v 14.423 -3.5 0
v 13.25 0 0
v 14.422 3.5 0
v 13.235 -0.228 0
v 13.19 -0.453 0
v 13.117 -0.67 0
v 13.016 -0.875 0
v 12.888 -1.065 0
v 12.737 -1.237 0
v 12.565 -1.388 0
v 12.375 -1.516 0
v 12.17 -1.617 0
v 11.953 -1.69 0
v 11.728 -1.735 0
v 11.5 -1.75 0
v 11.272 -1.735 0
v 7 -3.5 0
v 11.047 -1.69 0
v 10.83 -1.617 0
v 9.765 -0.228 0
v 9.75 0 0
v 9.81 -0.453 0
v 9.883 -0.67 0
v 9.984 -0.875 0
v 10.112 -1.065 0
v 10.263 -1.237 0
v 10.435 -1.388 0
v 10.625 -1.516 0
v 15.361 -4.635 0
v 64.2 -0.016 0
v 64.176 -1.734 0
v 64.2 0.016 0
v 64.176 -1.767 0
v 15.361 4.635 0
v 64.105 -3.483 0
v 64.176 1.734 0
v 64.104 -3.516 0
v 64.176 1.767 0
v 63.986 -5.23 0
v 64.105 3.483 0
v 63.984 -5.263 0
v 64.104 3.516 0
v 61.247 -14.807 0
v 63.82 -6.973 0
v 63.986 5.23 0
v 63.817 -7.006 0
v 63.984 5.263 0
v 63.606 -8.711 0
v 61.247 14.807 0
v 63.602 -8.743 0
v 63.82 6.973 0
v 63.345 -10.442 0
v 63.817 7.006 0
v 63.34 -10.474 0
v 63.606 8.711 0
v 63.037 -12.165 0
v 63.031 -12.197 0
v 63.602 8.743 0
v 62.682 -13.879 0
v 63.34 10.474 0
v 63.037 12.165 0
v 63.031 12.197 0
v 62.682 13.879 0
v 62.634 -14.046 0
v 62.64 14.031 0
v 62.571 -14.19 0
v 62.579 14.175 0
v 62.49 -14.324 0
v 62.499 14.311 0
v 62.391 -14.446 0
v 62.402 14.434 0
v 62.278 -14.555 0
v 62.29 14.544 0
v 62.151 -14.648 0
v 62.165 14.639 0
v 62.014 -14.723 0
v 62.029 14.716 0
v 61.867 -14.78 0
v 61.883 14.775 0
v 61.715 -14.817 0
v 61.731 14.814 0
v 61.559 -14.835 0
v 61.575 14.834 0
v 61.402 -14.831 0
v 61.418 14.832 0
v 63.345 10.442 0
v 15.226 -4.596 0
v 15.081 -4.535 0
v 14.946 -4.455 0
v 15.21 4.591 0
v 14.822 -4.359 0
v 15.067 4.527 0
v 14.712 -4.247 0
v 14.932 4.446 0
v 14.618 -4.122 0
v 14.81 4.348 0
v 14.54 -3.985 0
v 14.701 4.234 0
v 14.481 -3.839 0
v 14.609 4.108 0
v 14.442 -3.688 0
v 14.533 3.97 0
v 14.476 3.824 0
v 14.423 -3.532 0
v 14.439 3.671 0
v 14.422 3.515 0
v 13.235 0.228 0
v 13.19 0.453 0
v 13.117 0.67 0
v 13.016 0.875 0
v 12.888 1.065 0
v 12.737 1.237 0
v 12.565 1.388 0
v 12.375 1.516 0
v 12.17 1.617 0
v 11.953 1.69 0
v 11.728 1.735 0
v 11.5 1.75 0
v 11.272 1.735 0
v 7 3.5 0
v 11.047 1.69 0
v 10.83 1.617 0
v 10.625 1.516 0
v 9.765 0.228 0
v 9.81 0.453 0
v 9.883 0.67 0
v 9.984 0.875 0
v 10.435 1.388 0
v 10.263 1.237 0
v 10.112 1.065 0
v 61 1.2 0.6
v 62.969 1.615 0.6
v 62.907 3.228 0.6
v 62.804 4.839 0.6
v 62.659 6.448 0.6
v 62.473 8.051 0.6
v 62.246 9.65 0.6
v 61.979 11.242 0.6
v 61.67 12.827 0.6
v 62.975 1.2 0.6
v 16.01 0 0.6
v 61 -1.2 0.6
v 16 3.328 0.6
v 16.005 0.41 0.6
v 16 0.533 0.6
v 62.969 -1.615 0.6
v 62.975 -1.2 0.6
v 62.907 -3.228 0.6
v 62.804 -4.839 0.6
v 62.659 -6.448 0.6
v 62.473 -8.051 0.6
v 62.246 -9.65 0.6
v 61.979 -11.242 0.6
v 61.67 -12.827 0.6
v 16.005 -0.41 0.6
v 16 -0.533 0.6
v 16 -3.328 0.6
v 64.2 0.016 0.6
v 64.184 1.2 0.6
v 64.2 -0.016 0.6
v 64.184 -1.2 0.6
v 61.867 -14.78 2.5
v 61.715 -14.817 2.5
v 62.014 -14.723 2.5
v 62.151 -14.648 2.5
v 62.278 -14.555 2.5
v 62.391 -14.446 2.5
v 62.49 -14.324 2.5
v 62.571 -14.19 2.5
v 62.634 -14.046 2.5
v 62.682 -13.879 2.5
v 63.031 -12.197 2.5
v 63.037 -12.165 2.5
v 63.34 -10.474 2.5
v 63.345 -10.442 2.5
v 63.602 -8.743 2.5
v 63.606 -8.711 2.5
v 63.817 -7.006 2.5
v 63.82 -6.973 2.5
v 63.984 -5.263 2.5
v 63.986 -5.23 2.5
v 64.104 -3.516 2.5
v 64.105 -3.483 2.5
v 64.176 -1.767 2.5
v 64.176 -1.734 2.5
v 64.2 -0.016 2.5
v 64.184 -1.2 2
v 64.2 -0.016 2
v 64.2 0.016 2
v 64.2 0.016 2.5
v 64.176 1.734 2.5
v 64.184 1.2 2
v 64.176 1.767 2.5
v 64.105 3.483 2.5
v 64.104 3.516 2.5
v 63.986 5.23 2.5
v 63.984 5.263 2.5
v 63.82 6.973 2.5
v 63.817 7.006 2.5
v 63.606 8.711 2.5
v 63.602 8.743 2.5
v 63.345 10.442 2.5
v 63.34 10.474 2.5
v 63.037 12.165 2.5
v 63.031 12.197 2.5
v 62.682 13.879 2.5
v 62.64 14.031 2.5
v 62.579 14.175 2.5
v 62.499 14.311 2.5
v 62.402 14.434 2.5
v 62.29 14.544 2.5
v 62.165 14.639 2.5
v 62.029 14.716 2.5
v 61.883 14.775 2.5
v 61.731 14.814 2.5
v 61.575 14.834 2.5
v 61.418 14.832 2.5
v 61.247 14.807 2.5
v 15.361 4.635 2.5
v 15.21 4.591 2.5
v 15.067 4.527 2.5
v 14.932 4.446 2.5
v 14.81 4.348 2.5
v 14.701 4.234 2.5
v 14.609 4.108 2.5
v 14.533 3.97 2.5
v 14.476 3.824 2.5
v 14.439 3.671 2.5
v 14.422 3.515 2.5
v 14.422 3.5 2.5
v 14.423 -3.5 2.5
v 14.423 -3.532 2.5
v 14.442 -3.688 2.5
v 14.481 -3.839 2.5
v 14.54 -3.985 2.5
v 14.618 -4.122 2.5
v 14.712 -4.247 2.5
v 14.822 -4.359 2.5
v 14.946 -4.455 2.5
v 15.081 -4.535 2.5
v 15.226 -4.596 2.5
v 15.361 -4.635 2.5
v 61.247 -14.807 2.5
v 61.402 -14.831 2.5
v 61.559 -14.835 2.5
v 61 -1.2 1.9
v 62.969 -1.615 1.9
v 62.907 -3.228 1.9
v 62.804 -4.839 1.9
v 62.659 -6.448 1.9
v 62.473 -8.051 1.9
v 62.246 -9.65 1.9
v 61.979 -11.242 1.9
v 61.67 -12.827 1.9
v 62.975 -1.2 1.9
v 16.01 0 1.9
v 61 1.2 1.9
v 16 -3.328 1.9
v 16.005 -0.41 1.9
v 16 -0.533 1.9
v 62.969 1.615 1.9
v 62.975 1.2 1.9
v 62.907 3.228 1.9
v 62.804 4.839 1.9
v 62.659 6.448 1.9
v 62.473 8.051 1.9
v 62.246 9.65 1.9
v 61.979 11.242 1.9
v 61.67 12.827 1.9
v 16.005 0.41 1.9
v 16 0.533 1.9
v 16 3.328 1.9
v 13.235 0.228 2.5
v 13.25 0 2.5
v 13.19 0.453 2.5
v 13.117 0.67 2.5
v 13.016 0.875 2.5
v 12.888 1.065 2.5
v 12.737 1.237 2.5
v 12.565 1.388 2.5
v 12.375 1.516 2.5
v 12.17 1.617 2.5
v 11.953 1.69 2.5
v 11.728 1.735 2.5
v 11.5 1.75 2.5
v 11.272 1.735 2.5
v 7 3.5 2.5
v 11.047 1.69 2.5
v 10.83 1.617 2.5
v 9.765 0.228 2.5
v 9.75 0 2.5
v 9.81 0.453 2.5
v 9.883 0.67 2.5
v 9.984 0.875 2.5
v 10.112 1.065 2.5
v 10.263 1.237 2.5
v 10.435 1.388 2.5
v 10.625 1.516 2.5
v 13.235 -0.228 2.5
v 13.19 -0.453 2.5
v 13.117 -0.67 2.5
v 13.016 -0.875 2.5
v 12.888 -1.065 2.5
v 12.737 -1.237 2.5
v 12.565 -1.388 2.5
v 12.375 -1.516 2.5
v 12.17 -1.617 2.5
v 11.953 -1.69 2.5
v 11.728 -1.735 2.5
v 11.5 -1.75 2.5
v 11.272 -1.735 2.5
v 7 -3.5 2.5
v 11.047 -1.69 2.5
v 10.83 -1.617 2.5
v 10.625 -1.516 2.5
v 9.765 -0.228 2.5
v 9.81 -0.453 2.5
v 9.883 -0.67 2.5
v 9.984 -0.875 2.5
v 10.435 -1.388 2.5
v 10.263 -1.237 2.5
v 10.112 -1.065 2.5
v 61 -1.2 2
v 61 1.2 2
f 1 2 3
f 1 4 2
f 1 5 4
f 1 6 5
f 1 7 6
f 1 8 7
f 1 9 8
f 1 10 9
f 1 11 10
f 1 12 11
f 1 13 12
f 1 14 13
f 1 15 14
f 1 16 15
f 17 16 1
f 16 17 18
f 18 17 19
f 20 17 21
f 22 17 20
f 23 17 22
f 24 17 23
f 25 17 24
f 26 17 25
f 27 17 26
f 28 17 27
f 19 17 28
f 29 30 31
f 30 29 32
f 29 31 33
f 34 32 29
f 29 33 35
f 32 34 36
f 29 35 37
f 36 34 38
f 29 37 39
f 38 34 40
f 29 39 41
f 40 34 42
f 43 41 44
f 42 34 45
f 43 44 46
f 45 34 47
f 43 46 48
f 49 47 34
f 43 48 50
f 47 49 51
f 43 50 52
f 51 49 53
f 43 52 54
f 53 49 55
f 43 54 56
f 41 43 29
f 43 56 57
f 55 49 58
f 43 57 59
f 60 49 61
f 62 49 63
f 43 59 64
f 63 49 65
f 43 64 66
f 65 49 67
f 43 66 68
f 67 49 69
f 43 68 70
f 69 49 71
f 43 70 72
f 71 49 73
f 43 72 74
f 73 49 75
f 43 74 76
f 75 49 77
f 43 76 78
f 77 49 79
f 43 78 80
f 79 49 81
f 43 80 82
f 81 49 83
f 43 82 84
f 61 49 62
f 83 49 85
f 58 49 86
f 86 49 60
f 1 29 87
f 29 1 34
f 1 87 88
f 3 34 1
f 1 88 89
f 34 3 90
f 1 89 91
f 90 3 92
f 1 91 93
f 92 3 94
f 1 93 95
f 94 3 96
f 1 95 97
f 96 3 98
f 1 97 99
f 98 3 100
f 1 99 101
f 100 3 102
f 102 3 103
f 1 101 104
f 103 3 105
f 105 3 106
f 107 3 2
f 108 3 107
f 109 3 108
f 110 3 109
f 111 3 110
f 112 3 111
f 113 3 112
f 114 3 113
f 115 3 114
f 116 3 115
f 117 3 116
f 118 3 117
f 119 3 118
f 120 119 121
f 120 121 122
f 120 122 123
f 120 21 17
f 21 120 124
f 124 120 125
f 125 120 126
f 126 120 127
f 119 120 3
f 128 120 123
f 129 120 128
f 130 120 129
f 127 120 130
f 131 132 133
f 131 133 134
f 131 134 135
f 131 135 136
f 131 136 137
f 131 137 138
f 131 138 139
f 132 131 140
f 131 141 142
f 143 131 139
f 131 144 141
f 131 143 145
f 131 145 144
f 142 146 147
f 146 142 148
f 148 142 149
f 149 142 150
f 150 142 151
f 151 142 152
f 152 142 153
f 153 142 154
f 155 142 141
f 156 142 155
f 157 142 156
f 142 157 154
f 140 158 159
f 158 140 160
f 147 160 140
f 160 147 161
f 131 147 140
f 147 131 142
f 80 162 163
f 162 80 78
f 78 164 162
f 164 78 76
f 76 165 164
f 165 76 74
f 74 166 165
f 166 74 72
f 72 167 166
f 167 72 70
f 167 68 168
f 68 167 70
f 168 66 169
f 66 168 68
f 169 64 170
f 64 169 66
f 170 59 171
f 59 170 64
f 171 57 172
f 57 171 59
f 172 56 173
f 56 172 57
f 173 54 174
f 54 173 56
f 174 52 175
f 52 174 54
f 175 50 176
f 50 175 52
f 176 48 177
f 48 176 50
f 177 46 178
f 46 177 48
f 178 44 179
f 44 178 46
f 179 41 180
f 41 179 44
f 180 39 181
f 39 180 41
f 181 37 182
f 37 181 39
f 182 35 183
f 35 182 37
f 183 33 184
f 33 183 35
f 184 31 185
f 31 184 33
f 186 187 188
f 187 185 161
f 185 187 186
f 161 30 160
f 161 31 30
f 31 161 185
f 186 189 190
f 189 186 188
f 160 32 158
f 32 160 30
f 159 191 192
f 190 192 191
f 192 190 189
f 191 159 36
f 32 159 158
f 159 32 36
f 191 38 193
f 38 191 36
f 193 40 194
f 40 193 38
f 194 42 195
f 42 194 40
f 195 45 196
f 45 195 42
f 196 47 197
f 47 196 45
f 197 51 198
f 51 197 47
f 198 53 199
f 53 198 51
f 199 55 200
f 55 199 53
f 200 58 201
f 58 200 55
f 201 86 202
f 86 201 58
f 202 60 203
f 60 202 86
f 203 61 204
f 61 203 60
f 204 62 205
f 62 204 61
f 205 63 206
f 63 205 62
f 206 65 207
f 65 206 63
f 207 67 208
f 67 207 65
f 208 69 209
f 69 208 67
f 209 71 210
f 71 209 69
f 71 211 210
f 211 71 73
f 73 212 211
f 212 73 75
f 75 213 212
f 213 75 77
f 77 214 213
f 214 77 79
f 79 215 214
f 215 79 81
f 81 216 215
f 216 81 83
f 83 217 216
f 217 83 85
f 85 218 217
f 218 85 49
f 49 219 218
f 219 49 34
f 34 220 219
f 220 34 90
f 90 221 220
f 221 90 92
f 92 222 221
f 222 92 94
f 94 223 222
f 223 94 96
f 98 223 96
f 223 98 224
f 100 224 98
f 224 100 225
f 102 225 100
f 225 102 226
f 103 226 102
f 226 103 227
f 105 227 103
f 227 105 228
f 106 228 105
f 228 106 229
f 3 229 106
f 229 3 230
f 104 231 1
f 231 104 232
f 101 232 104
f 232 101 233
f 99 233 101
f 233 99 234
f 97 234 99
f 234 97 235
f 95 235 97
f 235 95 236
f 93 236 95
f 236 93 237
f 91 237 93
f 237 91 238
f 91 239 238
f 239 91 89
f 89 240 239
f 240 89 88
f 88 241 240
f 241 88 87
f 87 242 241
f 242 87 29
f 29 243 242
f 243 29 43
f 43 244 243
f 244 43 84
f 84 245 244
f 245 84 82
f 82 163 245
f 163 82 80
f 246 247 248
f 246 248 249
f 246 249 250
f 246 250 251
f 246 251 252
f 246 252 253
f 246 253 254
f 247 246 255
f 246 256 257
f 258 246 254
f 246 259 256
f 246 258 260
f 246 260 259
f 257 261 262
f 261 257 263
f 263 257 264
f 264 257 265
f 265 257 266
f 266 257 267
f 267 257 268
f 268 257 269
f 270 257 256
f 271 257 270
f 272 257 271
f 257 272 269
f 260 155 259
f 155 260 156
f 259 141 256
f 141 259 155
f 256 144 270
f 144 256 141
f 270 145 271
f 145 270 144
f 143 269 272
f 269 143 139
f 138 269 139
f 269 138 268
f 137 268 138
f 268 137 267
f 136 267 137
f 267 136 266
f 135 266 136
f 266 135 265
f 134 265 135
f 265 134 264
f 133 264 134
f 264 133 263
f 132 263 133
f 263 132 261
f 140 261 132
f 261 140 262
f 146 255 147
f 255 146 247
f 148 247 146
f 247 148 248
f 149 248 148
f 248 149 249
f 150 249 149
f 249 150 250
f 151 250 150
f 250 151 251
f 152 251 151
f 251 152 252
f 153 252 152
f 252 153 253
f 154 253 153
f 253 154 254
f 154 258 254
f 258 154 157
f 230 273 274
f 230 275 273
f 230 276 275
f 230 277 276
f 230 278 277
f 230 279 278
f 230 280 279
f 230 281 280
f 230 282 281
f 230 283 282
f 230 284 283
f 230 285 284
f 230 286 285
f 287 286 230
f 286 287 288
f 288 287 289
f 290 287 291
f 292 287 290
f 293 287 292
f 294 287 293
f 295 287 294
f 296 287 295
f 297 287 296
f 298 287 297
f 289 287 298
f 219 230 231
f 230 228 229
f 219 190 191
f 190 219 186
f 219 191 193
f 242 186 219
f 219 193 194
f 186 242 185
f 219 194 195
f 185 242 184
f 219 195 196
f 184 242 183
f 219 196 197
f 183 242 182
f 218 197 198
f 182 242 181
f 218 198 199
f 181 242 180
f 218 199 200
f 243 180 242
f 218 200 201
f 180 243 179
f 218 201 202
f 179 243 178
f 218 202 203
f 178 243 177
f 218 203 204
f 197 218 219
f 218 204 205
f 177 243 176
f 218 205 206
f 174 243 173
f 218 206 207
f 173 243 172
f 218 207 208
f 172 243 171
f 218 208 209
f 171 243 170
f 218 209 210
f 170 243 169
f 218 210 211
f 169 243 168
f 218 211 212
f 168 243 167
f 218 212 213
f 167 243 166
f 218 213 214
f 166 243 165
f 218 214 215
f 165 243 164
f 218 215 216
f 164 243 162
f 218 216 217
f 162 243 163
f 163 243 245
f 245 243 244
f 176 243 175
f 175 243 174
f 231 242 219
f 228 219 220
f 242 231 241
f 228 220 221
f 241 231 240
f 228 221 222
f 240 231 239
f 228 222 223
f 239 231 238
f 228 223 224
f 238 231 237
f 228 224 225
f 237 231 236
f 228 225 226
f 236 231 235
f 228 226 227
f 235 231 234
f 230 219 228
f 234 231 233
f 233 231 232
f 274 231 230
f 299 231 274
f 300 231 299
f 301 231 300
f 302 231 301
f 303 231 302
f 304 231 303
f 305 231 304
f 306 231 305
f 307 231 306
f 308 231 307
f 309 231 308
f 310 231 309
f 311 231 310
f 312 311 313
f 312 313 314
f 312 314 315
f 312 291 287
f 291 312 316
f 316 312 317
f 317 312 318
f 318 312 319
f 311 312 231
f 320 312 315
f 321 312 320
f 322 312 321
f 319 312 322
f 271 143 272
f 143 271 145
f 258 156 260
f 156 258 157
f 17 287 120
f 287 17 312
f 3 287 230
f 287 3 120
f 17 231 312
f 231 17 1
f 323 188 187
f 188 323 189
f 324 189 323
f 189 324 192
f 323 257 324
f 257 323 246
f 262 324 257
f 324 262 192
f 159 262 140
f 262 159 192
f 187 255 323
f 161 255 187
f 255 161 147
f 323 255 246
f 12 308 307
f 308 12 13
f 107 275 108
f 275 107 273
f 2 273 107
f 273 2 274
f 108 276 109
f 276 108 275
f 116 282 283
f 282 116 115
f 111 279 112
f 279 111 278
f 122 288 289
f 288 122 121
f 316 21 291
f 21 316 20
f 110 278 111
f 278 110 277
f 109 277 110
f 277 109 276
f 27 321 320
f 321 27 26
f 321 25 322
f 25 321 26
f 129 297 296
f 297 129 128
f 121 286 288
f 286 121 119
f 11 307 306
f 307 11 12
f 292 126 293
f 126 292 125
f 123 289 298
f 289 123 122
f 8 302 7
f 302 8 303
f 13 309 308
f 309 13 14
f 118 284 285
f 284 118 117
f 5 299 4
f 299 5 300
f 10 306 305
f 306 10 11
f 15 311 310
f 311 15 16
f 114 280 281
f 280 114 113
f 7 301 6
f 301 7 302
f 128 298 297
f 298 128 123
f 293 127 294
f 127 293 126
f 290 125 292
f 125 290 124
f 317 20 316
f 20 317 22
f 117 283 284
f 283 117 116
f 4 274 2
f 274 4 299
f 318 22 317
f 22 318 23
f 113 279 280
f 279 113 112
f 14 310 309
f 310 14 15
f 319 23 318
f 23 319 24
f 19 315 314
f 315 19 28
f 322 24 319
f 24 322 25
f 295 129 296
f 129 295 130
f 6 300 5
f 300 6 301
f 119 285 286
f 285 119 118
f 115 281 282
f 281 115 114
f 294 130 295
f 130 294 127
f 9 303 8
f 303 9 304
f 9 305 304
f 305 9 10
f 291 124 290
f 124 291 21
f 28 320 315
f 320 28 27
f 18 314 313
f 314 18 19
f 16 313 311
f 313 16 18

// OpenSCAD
// file: parameters.scad
// =============================================================================
// Gen-AP Vernier flux-claw mega - WOUND-AWARE (HARD GATE)
// Dual-rotor vernier: Rotor B +22.5 deg vs 12-slot stator; O5 flux claws
// =============================================================================

wire_awg            = 26;
wire_od             = 0.45;
turns               = 195;      // +10 vs Gen-AM 185
fill                = 0.70;
layers_per_face     = 2;
wind_build_axial    = layers_per_face * wire_od * fill;   // 0.63 mm
wind_build_radial   = 3 * wire_od * fill;                 // 0.945 mm

coil_id_r           = 16.0;
coil_od_r           = 63.0;
span_deg            = 25.0;
former_web          = 1.30;     // thinner vs AM 1.40
flange_t            = 0.60;
wall                = 1.2;
slot_w              = 2.4;
mount_hole          = 3.5;
tab_len             = 7.0;

former_bare_h       = former_web + 2 * flange_t;            // 2.50 mm
coil_envelope_h     = former_bare_h + 2 * wind_build_axial; // 3.76 mm

run_clear           = 0.50;
gap_spacer_h        = run_clear + wind_build_axial;         // 1.13 mm
m2m                 = coil_envelope_h + 2 * run_clear;      // 4.76 mm

coil_stations       = 12;
bay_r_in            = coil_id_r - 2.0 - wind_build_radial;
bay_r_out           = coil_od_r + 2.0 + wind_build_radial;
bay_span            = span_deg + 4.0;
bay_offset          = 2.0;
stator_thick        = former_bare_h;
stator_od           = 160.0;
shaft_clear_stator  = 34.0;
coil_mount_r        = 26.0;

large_pocket_d      = 20.3;
small_pocket_d      = 5.3;
pocket_h            = 5.2;
large_n             = 8;
R_large             = 39.5;     // closer to copper centroid vs AM R=40.5
R_small_inner       = 25.5;
R_small_mid         = 39.5;
R_small_outer       = 55.5;
carrier_od          = 156.0;
carrier_thick       = 7.5;
hub_h               = 10.0;
hub_od              = 30.0;
rotor_b_offset_deg  = 22.5;     // vernier offset vs 12-slot stator

shaft_bore          = 8.35;
bearing_d           = 21.85;
bearing_h           = 7.2;
m3_clear            = 3.5;
bolt_r_inner        = 36.0;
bolt_n_inner        = 6;
flange_bolt_r       = 72.0;
flange_bolt_n       = 6;
brace_r             = 68.0;
brace_d             = 4.3;
brace_n             = 4;

spacer_pad_od       = 14.0;
spacer_pad_id       = m3_clear;
endbell_od          = 160.0;
endbell_thick       = 8.0;
endbell_shaft_clear = 10.0;

$fn = 64;
// main file
// Gen-AP pancake former — wind BEFORE assembly
include <parameters.scad>;
$fn = 48;

module sector_2d(r_in, r_out, ang) {
    polygon([
        for (a = [-ang/2 : ang/16 : ang/2]) [r_in*cos(a), r_in*sin(a)],
        for (a = [ang/2 : -ang/16 : -ang/2]) [r_out*cos(a), r_out*sin(a)]
    ]);
}
module flange() {
    linear_extrude(flange_t) offset(r=wall) sector_2d(coil_id_r, coil_od_r, span_deg);
}
difference() {
    union() {
        flange();
        translate([0, 0, flange_t])
            linear_extrude(former_web)
                difference() {
                    offset(r=wall) sector_2d(coil_id_r, coil_od_r, span_deg);
                    sector_2d(coil_id_r + 0.01, coil_od_r - 0.01, span_deg - 1.5);
                }
        translate([0, 0, flange_t + former_web]) flange();
        translate([coil_id_r - tab_len - 2, -3.5, 0])
            cube([tab_len + 2, 7, former_bare_h]);
    }
    translate([coil_od_r - 2, -slot_w/2, flange_t])
        cube([wall + 4, slot_w, former_web + 0.1]);
    translate([coil_id_r - tab_len/2 - 1, 0, -0.1])
        cylinder(d=mount_hole, h=former_bare_h + 1);
}
